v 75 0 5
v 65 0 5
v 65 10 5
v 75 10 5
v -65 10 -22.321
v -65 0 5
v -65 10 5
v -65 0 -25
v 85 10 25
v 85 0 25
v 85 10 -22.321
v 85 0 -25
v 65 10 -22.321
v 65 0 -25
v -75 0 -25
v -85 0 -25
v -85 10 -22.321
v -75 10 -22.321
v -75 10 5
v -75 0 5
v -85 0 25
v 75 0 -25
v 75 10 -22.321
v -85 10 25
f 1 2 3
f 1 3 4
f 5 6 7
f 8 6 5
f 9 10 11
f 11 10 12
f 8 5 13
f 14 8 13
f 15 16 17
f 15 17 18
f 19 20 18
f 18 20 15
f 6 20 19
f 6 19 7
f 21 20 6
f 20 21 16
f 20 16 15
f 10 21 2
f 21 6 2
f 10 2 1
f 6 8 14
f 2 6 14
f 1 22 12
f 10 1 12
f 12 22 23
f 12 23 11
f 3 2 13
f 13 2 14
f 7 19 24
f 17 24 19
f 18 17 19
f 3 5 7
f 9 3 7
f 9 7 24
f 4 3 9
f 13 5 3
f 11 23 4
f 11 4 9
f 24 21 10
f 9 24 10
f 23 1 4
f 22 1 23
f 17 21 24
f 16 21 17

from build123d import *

# Parameters (mm, degrees)
SKETCH2_W           = 170
SKETCH2_H           = 50
BOSS_EXTRUDE1_DEPTH = 10
CHAMFER1_SIZE2      = 2.679491924
CHAMFER1_SIZE       = 10
SKETCH4_W           = 10
SKETCH4_H           = 30
CUT_EXTRUDE1_DEPTH  = 10


with BuildPart() as part:
    # Sketch2 → Boss-Extrude1 (new body)
    with BuildSketch(Plane(origin=(0, 0, 0), x_dir=(1, 0, 0), z_dir=(0, 1, 0))):
        Rectangle(SKETCH2_W, SKETCH2_H)
    extrude(amount=BOSS_EXTRUDE1_DEPTH)

    # Chamfer1
    chamfer1_edges = [part.edges().sort_by_distance(p)[0] for p in [
        (0, 10, -25),
    ]]
    chamfer1_side = [part.faces().sort_by_distance(p)[0] for p in [
        (0, 9.946410162, -25),
    ]]
    chamfer(chamfer1_edges, length=CHAMFER1_SIZE - 0.0001, length2=CHAMFER1_SIZE2 - 0.0001, reference=chamfer1_side[0])  # a hair under: the kernel refuses the full size

    # Sketch4 → Cut-Extrude1 (cut)
    with BuildSketch(Plane(origin=(0, 0, 0), x_dir=(1, 0, 0), z_dir=(0, 1, 0))):
        with Locations((70, 10)):
            Rectangle(SKETCH4_W, SKETCH4_H)
        with Locations((-70, 10)):
            Rectangle(SKETCH4_W, SKETCH4_H)
    extrude(amount=CUT_EXTRUDE1_DEPTH, mode=Mode.SUBTRACT)


solid = part.part
